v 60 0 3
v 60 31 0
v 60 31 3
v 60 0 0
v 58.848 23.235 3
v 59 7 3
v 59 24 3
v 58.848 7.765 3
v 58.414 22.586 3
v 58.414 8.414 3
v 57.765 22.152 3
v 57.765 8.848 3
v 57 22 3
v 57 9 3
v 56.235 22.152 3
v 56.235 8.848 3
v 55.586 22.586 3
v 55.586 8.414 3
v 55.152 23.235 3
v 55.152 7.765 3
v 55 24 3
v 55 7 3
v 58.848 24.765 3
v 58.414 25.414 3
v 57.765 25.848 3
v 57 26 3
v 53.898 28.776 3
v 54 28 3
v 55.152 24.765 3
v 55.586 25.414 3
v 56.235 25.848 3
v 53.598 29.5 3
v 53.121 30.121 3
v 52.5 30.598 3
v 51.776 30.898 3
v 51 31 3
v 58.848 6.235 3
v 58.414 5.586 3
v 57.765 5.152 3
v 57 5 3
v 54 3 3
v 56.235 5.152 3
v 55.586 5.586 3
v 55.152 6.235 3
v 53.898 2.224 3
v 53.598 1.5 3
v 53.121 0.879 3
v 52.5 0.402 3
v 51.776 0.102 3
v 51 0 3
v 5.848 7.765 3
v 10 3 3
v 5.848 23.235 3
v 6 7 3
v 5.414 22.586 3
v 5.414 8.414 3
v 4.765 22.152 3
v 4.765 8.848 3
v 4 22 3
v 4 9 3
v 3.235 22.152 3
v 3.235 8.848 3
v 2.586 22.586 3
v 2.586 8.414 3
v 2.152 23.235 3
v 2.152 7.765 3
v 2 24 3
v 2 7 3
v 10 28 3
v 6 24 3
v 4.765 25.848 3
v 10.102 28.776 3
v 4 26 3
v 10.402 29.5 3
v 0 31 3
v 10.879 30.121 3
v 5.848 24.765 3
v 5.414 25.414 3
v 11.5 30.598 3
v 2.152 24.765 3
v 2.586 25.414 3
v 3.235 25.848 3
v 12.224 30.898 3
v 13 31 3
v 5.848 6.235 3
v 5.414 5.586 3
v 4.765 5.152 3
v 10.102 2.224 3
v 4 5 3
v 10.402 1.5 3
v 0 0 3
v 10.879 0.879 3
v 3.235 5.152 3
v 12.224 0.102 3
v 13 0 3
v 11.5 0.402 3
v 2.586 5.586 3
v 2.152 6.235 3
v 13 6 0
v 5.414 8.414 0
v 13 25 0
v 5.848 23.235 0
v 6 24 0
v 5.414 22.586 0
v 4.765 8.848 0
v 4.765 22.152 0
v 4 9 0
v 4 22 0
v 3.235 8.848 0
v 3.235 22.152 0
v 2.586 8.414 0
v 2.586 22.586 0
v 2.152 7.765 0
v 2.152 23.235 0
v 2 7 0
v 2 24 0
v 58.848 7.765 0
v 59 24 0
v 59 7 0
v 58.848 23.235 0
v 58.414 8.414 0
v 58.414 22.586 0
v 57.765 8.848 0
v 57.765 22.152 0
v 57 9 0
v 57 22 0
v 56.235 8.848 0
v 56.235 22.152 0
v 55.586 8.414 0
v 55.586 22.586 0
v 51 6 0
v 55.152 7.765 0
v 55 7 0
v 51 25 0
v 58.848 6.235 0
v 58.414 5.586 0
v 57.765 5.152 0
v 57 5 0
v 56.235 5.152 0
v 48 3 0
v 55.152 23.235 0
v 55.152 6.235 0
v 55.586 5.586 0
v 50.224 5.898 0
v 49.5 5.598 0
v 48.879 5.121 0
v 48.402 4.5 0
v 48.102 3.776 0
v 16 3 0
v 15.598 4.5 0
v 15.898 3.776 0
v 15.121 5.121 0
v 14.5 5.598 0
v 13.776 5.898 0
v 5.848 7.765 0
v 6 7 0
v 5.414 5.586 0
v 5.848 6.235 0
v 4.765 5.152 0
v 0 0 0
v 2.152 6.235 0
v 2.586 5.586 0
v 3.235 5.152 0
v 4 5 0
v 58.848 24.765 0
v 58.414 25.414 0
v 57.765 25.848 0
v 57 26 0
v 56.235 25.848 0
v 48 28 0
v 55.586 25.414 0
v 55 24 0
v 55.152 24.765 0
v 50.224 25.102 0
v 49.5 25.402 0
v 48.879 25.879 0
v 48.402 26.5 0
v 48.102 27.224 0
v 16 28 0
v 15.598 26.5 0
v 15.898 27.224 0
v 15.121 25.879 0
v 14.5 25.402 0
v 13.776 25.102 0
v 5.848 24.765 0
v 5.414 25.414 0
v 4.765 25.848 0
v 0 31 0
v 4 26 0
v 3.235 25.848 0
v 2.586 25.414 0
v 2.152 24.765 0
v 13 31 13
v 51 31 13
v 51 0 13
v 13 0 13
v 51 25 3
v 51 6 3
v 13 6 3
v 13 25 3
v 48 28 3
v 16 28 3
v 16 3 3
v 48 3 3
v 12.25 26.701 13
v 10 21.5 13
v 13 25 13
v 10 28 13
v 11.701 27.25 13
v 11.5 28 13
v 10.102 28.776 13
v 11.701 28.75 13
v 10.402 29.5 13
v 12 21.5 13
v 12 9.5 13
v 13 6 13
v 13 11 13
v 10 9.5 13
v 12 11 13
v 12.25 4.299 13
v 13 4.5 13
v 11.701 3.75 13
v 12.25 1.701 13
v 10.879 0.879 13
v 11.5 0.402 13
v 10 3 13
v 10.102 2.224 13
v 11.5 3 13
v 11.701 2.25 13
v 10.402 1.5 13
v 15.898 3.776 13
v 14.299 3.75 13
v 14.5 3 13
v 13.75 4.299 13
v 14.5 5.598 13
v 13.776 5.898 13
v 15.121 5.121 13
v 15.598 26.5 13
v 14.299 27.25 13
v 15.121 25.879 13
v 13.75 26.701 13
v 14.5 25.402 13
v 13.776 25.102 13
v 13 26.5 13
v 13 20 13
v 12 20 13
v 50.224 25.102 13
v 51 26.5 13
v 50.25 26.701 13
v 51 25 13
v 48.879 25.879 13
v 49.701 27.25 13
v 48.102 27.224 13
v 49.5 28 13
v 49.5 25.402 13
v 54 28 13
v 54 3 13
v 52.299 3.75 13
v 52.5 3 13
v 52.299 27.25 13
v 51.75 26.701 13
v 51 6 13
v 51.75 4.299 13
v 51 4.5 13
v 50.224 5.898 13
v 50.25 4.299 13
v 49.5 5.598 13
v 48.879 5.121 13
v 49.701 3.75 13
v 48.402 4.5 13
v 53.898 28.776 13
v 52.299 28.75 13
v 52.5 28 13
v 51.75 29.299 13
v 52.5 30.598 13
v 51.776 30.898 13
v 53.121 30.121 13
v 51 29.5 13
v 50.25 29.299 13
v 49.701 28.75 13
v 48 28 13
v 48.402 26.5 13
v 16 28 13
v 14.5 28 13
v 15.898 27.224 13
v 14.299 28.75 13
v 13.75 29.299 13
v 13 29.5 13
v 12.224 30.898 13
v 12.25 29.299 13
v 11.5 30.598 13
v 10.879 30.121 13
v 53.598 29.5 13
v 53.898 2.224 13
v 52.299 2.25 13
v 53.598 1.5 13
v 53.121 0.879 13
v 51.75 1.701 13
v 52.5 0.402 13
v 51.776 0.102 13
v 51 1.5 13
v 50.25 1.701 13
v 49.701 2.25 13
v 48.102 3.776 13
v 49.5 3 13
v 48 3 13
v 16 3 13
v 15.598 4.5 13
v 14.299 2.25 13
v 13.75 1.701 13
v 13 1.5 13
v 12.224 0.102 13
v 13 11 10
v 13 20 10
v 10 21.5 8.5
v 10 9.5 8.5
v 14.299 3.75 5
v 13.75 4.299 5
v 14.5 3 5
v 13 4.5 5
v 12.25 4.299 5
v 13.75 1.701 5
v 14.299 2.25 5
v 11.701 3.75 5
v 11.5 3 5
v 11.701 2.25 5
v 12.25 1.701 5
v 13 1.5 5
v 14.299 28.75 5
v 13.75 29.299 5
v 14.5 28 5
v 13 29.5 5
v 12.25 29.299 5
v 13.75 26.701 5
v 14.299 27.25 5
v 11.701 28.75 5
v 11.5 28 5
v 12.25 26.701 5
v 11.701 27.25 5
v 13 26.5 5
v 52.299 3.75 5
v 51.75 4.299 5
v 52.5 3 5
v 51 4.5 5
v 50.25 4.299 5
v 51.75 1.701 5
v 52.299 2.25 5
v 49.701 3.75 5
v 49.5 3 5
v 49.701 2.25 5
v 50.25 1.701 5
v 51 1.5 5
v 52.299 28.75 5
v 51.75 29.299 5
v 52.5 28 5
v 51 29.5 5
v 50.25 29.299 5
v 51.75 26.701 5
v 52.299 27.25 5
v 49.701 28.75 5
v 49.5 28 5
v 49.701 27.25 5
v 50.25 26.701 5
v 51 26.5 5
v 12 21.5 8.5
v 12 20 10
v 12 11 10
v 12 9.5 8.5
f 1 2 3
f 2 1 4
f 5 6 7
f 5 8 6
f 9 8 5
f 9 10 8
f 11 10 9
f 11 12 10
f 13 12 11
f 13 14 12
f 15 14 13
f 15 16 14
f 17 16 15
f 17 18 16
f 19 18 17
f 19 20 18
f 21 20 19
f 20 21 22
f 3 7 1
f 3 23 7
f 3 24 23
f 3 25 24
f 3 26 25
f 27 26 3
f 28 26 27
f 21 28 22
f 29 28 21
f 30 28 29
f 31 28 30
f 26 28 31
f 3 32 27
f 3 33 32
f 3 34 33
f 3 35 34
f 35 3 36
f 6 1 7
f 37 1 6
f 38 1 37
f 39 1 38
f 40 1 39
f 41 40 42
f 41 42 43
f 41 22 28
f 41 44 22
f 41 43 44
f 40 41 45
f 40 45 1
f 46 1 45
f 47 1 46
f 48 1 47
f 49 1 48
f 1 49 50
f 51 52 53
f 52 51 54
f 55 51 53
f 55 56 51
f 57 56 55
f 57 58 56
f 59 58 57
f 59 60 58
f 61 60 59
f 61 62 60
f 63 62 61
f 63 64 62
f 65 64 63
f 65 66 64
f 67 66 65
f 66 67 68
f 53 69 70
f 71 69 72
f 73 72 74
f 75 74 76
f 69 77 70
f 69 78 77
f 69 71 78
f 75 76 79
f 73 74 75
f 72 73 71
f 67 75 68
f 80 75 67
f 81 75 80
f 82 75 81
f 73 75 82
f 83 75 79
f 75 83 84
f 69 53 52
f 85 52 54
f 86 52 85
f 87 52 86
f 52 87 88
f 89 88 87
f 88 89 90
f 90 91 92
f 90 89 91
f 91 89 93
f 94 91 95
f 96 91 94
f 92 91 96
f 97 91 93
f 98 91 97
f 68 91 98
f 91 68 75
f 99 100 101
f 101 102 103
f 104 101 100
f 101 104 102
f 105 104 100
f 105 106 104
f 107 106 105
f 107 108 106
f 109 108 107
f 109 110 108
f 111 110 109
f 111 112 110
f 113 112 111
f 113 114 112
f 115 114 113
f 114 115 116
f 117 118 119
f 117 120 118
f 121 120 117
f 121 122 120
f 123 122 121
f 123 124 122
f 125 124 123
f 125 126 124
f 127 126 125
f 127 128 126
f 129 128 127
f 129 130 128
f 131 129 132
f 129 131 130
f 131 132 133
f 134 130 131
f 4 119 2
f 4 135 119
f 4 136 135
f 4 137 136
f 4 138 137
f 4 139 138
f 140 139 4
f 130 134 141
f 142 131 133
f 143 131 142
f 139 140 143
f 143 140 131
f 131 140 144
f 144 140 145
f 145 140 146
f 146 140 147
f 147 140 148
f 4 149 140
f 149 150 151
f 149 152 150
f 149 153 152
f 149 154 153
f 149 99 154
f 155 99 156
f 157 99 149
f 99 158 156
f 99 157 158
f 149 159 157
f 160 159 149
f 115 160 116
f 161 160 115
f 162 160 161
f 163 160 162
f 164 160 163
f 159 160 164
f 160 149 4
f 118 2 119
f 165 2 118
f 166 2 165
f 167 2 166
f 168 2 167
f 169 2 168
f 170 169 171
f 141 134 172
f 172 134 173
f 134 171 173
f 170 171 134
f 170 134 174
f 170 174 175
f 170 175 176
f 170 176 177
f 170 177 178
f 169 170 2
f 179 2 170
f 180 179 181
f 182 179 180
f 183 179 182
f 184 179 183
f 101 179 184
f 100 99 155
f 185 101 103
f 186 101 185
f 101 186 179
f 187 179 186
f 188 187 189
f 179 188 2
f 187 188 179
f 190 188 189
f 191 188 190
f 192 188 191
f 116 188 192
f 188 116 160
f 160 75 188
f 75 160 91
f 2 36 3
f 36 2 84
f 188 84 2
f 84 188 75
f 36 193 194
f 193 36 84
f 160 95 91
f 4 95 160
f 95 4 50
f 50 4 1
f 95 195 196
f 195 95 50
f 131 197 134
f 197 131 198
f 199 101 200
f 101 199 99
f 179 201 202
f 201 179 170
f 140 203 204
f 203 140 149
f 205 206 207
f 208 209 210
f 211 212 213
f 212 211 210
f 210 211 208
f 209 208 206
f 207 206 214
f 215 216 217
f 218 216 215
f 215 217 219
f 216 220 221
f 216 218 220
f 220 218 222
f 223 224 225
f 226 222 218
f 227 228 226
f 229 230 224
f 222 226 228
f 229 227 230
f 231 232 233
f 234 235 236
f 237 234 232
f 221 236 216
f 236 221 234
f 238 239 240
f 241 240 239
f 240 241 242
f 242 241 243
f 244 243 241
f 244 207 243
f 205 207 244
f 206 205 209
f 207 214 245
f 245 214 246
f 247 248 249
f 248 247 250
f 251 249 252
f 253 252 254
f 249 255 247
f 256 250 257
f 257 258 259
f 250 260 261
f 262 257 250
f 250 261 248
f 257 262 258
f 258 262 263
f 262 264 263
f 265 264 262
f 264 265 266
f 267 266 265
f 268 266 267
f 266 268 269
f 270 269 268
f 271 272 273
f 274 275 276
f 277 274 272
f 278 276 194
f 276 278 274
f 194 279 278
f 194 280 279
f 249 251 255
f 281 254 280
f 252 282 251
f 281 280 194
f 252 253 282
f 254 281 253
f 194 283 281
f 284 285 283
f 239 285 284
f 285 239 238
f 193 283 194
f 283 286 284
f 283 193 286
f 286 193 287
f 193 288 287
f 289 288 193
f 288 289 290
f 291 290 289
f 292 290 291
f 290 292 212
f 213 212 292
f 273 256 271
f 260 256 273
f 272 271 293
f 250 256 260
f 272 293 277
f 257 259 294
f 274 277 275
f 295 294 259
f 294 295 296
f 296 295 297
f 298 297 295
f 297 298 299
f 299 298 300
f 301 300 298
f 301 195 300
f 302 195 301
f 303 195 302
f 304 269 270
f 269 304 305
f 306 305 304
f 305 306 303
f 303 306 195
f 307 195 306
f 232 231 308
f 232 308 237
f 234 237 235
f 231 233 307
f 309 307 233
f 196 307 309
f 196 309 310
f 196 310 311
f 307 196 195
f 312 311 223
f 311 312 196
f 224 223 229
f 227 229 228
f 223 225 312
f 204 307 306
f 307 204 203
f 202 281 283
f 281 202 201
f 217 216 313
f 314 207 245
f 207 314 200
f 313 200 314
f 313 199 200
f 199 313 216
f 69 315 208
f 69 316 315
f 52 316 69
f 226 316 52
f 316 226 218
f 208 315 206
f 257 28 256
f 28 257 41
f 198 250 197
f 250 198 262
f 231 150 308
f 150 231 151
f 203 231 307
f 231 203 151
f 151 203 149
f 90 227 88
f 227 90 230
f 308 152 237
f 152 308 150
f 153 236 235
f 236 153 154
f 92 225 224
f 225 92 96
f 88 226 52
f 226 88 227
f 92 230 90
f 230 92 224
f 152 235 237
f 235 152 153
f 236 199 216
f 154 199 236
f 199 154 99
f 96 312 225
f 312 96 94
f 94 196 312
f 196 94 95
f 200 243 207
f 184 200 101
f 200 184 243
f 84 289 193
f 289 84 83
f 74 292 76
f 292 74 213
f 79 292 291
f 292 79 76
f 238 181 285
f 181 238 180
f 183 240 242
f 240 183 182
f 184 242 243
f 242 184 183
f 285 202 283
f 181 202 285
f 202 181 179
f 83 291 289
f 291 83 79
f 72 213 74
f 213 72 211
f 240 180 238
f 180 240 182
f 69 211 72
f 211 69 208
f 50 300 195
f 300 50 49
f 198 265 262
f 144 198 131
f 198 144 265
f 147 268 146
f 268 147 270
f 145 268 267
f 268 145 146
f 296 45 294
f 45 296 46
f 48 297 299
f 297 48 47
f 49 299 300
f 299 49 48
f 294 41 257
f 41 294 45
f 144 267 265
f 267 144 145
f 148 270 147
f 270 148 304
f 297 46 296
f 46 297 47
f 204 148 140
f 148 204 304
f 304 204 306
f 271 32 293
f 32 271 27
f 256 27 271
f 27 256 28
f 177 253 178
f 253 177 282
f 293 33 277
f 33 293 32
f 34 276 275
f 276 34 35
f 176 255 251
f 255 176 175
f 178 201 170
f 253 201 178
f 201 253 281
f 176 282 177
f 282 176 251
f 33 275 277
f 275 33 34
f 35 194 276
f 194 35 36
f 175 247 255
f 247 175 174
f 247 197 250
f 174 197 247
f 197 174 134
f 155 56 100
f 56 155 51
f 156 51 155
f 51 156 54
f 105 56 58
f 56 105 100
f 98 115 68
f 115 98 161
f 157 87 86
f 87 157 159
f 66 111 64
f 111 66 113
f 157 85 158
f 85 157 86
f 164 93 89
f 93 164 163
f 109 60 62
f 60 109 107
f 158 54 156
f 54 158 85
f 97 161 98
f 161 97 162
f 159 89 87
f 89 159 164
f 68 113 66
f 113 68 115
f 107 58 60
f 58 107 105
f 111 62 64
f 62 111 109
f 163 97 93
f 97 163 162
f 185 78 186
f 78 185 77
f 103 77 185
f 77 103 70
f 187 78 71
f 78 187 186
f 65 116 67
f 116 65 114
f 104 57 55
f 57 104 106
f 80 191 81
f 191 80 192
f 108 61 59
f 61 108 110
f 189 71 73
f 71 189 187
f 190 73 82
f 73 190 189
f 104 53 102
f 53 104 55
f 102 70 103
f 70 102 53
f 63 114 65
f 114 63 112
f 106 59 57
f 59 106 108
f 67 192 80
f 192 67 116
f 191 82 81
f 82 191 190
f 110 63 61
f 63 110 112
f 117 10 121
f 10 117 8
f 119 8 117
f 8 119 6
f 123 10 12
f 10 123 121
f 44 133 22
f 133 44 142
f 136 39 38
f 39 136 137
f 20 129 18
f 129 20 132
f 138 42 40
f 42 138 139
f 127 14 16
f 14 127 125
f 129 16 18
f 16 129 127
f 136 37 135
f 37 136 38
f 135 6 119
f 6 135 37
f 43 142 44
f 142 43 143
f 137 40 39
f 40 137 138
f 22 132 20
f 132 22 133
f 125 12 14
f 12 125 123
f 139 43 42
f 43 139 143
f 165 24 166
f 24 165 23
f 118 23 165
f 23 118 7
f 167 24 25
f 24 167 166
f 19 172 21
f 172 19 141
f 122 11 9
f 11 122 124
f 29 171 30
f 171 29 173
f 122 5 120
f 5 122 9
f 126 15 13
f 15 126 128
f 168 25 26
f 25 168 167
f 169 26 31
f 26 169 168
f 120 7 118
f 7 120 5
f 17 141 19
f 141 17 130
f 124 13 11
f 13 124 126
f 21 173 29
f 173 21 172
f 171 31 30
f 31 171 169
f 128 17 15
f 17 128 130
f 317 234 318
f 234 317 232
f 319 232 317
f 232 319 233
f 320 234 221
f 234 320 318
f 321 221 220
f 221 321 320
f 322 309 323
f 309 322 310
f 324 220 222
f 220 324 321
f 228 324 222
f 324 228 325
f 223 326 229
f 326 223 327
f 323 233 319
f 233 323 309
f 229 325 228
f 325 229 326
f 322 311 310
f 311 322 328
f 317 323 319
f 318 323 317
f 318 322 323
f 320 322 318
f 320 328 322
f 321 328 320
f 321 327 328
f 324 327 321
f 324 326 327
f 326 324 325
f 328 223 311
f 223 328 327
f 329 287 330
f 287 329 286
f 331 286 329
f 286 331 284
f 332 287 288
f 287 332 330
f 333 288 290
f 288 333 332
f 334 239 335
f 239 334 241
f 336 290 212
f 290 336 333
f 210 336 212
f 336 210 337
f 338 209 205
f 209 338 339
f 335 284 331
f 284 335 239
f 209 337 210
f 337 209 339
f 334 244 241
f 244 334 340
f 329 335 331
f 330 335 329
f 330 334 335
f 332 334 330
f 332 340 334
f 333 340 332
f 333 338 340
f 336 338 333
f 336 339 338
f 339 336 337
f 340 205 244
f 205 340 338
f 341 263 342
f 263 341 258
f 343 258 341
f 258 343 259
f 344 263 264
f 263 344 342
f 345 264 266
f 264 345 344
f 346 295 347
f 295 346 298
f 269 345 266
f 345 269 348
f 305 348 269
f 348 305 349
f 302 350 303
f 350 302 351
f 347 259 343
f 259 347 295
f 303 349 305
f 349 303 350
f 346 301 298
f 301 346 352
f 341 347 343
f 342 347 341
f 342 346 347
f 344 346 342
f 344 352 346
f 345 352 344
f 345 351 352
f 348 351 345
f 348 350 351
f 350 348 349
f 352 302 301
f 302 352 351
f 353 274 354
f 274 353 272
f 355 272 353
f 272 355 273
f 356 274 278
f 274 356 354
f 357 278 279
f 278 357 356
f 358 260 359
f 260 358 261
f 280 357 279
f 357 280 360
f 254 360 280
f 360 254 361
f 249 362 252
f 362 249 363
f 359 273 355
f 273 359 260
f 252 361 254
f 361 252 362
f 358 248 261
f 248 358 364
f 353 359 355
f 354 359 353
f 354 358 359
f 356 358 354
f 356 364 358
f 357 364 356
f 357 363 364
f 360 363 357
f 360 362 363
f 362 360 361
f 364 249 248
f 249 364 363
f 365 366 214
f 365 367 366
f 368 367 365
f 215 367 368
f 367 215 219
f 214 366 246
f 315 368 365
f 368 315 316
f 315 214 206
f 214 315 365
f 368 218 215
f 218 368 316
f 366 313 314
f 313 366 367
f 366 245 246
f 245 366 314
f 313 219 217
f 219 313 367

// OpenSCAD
height = 13;
length = 60;
width = 31;

thickness = 3;
hole = [4,4] ;  
plugWidth = 12;
plugDepth = 4;

$fa = 6;
$fs = 0.8;

module fourHole(x, y, diam){
    xy = [1,-1];
for(a = [0:1],b=[0:1]){
translate([x/2*xy[a],y/2*xy[b],5])
    cylinder(11,d=diam,center = true);
}    
}

 difference(){
 union(){
difference(){
cube([length,width,thickness]);  // base
    translate([13,thickness,-1])
    cube([38,25,thickness+2]);      // cut out from base
}
// walls
 translate([13,0,thickness])
 cube([38,3,height-thickness]);
 translate([13,28,thickness])
 cube([38,3,height-thickness]);
 translate([10,3,thickness])
 cube([3,25,height-thickness]);
 translate([51,3,thickness])
 cube([3,25,height-thickness]);

 translate([13,3,0])
 cylinder(height,3,3);
  
  translate([13,28,0])
 cylinder(height,3,3);
  translate([51,3,0])
 cylinder(height,3,3);
  translate([51,28,0])
 cylinder(height,3,3);
 }   // end of union
   // mounting holes in base
  translate([4,7,-1])
    cylinder(thickness+2,2,2);
   translate([4,24,-1])
    cylinder(thickness+2,2,2);
   translate([57,7,-1])
    cylinder(thickness+2,2,2);
   translate([57,24,-1])
    cylinder(thickness+2,2,2);
 
  translate([13,3,height-8])
   cylinder(9,d=3);
   translate([13,28,height-8])
   cylinder(9,d=3);
   translate([51,3,height-8])
   cylinder(9,d=3);
   translate([51,28,height-8])
   cylinder(9,d=3);
 //  translate([9+thickness/2,18+thickness - plugWidth/2,height-plugDepth/2])
   translate([9+thickness/2,15.5,height-plugDepth/2])
   cube([3,plugWidth,plugDepth+1], center = true); 
   translate([9+thickness/2,15.5,height-plugDepth/2+2])
   cube([7,9,plugDepth+2], center = true);  // y was 7
   
   
 } 
